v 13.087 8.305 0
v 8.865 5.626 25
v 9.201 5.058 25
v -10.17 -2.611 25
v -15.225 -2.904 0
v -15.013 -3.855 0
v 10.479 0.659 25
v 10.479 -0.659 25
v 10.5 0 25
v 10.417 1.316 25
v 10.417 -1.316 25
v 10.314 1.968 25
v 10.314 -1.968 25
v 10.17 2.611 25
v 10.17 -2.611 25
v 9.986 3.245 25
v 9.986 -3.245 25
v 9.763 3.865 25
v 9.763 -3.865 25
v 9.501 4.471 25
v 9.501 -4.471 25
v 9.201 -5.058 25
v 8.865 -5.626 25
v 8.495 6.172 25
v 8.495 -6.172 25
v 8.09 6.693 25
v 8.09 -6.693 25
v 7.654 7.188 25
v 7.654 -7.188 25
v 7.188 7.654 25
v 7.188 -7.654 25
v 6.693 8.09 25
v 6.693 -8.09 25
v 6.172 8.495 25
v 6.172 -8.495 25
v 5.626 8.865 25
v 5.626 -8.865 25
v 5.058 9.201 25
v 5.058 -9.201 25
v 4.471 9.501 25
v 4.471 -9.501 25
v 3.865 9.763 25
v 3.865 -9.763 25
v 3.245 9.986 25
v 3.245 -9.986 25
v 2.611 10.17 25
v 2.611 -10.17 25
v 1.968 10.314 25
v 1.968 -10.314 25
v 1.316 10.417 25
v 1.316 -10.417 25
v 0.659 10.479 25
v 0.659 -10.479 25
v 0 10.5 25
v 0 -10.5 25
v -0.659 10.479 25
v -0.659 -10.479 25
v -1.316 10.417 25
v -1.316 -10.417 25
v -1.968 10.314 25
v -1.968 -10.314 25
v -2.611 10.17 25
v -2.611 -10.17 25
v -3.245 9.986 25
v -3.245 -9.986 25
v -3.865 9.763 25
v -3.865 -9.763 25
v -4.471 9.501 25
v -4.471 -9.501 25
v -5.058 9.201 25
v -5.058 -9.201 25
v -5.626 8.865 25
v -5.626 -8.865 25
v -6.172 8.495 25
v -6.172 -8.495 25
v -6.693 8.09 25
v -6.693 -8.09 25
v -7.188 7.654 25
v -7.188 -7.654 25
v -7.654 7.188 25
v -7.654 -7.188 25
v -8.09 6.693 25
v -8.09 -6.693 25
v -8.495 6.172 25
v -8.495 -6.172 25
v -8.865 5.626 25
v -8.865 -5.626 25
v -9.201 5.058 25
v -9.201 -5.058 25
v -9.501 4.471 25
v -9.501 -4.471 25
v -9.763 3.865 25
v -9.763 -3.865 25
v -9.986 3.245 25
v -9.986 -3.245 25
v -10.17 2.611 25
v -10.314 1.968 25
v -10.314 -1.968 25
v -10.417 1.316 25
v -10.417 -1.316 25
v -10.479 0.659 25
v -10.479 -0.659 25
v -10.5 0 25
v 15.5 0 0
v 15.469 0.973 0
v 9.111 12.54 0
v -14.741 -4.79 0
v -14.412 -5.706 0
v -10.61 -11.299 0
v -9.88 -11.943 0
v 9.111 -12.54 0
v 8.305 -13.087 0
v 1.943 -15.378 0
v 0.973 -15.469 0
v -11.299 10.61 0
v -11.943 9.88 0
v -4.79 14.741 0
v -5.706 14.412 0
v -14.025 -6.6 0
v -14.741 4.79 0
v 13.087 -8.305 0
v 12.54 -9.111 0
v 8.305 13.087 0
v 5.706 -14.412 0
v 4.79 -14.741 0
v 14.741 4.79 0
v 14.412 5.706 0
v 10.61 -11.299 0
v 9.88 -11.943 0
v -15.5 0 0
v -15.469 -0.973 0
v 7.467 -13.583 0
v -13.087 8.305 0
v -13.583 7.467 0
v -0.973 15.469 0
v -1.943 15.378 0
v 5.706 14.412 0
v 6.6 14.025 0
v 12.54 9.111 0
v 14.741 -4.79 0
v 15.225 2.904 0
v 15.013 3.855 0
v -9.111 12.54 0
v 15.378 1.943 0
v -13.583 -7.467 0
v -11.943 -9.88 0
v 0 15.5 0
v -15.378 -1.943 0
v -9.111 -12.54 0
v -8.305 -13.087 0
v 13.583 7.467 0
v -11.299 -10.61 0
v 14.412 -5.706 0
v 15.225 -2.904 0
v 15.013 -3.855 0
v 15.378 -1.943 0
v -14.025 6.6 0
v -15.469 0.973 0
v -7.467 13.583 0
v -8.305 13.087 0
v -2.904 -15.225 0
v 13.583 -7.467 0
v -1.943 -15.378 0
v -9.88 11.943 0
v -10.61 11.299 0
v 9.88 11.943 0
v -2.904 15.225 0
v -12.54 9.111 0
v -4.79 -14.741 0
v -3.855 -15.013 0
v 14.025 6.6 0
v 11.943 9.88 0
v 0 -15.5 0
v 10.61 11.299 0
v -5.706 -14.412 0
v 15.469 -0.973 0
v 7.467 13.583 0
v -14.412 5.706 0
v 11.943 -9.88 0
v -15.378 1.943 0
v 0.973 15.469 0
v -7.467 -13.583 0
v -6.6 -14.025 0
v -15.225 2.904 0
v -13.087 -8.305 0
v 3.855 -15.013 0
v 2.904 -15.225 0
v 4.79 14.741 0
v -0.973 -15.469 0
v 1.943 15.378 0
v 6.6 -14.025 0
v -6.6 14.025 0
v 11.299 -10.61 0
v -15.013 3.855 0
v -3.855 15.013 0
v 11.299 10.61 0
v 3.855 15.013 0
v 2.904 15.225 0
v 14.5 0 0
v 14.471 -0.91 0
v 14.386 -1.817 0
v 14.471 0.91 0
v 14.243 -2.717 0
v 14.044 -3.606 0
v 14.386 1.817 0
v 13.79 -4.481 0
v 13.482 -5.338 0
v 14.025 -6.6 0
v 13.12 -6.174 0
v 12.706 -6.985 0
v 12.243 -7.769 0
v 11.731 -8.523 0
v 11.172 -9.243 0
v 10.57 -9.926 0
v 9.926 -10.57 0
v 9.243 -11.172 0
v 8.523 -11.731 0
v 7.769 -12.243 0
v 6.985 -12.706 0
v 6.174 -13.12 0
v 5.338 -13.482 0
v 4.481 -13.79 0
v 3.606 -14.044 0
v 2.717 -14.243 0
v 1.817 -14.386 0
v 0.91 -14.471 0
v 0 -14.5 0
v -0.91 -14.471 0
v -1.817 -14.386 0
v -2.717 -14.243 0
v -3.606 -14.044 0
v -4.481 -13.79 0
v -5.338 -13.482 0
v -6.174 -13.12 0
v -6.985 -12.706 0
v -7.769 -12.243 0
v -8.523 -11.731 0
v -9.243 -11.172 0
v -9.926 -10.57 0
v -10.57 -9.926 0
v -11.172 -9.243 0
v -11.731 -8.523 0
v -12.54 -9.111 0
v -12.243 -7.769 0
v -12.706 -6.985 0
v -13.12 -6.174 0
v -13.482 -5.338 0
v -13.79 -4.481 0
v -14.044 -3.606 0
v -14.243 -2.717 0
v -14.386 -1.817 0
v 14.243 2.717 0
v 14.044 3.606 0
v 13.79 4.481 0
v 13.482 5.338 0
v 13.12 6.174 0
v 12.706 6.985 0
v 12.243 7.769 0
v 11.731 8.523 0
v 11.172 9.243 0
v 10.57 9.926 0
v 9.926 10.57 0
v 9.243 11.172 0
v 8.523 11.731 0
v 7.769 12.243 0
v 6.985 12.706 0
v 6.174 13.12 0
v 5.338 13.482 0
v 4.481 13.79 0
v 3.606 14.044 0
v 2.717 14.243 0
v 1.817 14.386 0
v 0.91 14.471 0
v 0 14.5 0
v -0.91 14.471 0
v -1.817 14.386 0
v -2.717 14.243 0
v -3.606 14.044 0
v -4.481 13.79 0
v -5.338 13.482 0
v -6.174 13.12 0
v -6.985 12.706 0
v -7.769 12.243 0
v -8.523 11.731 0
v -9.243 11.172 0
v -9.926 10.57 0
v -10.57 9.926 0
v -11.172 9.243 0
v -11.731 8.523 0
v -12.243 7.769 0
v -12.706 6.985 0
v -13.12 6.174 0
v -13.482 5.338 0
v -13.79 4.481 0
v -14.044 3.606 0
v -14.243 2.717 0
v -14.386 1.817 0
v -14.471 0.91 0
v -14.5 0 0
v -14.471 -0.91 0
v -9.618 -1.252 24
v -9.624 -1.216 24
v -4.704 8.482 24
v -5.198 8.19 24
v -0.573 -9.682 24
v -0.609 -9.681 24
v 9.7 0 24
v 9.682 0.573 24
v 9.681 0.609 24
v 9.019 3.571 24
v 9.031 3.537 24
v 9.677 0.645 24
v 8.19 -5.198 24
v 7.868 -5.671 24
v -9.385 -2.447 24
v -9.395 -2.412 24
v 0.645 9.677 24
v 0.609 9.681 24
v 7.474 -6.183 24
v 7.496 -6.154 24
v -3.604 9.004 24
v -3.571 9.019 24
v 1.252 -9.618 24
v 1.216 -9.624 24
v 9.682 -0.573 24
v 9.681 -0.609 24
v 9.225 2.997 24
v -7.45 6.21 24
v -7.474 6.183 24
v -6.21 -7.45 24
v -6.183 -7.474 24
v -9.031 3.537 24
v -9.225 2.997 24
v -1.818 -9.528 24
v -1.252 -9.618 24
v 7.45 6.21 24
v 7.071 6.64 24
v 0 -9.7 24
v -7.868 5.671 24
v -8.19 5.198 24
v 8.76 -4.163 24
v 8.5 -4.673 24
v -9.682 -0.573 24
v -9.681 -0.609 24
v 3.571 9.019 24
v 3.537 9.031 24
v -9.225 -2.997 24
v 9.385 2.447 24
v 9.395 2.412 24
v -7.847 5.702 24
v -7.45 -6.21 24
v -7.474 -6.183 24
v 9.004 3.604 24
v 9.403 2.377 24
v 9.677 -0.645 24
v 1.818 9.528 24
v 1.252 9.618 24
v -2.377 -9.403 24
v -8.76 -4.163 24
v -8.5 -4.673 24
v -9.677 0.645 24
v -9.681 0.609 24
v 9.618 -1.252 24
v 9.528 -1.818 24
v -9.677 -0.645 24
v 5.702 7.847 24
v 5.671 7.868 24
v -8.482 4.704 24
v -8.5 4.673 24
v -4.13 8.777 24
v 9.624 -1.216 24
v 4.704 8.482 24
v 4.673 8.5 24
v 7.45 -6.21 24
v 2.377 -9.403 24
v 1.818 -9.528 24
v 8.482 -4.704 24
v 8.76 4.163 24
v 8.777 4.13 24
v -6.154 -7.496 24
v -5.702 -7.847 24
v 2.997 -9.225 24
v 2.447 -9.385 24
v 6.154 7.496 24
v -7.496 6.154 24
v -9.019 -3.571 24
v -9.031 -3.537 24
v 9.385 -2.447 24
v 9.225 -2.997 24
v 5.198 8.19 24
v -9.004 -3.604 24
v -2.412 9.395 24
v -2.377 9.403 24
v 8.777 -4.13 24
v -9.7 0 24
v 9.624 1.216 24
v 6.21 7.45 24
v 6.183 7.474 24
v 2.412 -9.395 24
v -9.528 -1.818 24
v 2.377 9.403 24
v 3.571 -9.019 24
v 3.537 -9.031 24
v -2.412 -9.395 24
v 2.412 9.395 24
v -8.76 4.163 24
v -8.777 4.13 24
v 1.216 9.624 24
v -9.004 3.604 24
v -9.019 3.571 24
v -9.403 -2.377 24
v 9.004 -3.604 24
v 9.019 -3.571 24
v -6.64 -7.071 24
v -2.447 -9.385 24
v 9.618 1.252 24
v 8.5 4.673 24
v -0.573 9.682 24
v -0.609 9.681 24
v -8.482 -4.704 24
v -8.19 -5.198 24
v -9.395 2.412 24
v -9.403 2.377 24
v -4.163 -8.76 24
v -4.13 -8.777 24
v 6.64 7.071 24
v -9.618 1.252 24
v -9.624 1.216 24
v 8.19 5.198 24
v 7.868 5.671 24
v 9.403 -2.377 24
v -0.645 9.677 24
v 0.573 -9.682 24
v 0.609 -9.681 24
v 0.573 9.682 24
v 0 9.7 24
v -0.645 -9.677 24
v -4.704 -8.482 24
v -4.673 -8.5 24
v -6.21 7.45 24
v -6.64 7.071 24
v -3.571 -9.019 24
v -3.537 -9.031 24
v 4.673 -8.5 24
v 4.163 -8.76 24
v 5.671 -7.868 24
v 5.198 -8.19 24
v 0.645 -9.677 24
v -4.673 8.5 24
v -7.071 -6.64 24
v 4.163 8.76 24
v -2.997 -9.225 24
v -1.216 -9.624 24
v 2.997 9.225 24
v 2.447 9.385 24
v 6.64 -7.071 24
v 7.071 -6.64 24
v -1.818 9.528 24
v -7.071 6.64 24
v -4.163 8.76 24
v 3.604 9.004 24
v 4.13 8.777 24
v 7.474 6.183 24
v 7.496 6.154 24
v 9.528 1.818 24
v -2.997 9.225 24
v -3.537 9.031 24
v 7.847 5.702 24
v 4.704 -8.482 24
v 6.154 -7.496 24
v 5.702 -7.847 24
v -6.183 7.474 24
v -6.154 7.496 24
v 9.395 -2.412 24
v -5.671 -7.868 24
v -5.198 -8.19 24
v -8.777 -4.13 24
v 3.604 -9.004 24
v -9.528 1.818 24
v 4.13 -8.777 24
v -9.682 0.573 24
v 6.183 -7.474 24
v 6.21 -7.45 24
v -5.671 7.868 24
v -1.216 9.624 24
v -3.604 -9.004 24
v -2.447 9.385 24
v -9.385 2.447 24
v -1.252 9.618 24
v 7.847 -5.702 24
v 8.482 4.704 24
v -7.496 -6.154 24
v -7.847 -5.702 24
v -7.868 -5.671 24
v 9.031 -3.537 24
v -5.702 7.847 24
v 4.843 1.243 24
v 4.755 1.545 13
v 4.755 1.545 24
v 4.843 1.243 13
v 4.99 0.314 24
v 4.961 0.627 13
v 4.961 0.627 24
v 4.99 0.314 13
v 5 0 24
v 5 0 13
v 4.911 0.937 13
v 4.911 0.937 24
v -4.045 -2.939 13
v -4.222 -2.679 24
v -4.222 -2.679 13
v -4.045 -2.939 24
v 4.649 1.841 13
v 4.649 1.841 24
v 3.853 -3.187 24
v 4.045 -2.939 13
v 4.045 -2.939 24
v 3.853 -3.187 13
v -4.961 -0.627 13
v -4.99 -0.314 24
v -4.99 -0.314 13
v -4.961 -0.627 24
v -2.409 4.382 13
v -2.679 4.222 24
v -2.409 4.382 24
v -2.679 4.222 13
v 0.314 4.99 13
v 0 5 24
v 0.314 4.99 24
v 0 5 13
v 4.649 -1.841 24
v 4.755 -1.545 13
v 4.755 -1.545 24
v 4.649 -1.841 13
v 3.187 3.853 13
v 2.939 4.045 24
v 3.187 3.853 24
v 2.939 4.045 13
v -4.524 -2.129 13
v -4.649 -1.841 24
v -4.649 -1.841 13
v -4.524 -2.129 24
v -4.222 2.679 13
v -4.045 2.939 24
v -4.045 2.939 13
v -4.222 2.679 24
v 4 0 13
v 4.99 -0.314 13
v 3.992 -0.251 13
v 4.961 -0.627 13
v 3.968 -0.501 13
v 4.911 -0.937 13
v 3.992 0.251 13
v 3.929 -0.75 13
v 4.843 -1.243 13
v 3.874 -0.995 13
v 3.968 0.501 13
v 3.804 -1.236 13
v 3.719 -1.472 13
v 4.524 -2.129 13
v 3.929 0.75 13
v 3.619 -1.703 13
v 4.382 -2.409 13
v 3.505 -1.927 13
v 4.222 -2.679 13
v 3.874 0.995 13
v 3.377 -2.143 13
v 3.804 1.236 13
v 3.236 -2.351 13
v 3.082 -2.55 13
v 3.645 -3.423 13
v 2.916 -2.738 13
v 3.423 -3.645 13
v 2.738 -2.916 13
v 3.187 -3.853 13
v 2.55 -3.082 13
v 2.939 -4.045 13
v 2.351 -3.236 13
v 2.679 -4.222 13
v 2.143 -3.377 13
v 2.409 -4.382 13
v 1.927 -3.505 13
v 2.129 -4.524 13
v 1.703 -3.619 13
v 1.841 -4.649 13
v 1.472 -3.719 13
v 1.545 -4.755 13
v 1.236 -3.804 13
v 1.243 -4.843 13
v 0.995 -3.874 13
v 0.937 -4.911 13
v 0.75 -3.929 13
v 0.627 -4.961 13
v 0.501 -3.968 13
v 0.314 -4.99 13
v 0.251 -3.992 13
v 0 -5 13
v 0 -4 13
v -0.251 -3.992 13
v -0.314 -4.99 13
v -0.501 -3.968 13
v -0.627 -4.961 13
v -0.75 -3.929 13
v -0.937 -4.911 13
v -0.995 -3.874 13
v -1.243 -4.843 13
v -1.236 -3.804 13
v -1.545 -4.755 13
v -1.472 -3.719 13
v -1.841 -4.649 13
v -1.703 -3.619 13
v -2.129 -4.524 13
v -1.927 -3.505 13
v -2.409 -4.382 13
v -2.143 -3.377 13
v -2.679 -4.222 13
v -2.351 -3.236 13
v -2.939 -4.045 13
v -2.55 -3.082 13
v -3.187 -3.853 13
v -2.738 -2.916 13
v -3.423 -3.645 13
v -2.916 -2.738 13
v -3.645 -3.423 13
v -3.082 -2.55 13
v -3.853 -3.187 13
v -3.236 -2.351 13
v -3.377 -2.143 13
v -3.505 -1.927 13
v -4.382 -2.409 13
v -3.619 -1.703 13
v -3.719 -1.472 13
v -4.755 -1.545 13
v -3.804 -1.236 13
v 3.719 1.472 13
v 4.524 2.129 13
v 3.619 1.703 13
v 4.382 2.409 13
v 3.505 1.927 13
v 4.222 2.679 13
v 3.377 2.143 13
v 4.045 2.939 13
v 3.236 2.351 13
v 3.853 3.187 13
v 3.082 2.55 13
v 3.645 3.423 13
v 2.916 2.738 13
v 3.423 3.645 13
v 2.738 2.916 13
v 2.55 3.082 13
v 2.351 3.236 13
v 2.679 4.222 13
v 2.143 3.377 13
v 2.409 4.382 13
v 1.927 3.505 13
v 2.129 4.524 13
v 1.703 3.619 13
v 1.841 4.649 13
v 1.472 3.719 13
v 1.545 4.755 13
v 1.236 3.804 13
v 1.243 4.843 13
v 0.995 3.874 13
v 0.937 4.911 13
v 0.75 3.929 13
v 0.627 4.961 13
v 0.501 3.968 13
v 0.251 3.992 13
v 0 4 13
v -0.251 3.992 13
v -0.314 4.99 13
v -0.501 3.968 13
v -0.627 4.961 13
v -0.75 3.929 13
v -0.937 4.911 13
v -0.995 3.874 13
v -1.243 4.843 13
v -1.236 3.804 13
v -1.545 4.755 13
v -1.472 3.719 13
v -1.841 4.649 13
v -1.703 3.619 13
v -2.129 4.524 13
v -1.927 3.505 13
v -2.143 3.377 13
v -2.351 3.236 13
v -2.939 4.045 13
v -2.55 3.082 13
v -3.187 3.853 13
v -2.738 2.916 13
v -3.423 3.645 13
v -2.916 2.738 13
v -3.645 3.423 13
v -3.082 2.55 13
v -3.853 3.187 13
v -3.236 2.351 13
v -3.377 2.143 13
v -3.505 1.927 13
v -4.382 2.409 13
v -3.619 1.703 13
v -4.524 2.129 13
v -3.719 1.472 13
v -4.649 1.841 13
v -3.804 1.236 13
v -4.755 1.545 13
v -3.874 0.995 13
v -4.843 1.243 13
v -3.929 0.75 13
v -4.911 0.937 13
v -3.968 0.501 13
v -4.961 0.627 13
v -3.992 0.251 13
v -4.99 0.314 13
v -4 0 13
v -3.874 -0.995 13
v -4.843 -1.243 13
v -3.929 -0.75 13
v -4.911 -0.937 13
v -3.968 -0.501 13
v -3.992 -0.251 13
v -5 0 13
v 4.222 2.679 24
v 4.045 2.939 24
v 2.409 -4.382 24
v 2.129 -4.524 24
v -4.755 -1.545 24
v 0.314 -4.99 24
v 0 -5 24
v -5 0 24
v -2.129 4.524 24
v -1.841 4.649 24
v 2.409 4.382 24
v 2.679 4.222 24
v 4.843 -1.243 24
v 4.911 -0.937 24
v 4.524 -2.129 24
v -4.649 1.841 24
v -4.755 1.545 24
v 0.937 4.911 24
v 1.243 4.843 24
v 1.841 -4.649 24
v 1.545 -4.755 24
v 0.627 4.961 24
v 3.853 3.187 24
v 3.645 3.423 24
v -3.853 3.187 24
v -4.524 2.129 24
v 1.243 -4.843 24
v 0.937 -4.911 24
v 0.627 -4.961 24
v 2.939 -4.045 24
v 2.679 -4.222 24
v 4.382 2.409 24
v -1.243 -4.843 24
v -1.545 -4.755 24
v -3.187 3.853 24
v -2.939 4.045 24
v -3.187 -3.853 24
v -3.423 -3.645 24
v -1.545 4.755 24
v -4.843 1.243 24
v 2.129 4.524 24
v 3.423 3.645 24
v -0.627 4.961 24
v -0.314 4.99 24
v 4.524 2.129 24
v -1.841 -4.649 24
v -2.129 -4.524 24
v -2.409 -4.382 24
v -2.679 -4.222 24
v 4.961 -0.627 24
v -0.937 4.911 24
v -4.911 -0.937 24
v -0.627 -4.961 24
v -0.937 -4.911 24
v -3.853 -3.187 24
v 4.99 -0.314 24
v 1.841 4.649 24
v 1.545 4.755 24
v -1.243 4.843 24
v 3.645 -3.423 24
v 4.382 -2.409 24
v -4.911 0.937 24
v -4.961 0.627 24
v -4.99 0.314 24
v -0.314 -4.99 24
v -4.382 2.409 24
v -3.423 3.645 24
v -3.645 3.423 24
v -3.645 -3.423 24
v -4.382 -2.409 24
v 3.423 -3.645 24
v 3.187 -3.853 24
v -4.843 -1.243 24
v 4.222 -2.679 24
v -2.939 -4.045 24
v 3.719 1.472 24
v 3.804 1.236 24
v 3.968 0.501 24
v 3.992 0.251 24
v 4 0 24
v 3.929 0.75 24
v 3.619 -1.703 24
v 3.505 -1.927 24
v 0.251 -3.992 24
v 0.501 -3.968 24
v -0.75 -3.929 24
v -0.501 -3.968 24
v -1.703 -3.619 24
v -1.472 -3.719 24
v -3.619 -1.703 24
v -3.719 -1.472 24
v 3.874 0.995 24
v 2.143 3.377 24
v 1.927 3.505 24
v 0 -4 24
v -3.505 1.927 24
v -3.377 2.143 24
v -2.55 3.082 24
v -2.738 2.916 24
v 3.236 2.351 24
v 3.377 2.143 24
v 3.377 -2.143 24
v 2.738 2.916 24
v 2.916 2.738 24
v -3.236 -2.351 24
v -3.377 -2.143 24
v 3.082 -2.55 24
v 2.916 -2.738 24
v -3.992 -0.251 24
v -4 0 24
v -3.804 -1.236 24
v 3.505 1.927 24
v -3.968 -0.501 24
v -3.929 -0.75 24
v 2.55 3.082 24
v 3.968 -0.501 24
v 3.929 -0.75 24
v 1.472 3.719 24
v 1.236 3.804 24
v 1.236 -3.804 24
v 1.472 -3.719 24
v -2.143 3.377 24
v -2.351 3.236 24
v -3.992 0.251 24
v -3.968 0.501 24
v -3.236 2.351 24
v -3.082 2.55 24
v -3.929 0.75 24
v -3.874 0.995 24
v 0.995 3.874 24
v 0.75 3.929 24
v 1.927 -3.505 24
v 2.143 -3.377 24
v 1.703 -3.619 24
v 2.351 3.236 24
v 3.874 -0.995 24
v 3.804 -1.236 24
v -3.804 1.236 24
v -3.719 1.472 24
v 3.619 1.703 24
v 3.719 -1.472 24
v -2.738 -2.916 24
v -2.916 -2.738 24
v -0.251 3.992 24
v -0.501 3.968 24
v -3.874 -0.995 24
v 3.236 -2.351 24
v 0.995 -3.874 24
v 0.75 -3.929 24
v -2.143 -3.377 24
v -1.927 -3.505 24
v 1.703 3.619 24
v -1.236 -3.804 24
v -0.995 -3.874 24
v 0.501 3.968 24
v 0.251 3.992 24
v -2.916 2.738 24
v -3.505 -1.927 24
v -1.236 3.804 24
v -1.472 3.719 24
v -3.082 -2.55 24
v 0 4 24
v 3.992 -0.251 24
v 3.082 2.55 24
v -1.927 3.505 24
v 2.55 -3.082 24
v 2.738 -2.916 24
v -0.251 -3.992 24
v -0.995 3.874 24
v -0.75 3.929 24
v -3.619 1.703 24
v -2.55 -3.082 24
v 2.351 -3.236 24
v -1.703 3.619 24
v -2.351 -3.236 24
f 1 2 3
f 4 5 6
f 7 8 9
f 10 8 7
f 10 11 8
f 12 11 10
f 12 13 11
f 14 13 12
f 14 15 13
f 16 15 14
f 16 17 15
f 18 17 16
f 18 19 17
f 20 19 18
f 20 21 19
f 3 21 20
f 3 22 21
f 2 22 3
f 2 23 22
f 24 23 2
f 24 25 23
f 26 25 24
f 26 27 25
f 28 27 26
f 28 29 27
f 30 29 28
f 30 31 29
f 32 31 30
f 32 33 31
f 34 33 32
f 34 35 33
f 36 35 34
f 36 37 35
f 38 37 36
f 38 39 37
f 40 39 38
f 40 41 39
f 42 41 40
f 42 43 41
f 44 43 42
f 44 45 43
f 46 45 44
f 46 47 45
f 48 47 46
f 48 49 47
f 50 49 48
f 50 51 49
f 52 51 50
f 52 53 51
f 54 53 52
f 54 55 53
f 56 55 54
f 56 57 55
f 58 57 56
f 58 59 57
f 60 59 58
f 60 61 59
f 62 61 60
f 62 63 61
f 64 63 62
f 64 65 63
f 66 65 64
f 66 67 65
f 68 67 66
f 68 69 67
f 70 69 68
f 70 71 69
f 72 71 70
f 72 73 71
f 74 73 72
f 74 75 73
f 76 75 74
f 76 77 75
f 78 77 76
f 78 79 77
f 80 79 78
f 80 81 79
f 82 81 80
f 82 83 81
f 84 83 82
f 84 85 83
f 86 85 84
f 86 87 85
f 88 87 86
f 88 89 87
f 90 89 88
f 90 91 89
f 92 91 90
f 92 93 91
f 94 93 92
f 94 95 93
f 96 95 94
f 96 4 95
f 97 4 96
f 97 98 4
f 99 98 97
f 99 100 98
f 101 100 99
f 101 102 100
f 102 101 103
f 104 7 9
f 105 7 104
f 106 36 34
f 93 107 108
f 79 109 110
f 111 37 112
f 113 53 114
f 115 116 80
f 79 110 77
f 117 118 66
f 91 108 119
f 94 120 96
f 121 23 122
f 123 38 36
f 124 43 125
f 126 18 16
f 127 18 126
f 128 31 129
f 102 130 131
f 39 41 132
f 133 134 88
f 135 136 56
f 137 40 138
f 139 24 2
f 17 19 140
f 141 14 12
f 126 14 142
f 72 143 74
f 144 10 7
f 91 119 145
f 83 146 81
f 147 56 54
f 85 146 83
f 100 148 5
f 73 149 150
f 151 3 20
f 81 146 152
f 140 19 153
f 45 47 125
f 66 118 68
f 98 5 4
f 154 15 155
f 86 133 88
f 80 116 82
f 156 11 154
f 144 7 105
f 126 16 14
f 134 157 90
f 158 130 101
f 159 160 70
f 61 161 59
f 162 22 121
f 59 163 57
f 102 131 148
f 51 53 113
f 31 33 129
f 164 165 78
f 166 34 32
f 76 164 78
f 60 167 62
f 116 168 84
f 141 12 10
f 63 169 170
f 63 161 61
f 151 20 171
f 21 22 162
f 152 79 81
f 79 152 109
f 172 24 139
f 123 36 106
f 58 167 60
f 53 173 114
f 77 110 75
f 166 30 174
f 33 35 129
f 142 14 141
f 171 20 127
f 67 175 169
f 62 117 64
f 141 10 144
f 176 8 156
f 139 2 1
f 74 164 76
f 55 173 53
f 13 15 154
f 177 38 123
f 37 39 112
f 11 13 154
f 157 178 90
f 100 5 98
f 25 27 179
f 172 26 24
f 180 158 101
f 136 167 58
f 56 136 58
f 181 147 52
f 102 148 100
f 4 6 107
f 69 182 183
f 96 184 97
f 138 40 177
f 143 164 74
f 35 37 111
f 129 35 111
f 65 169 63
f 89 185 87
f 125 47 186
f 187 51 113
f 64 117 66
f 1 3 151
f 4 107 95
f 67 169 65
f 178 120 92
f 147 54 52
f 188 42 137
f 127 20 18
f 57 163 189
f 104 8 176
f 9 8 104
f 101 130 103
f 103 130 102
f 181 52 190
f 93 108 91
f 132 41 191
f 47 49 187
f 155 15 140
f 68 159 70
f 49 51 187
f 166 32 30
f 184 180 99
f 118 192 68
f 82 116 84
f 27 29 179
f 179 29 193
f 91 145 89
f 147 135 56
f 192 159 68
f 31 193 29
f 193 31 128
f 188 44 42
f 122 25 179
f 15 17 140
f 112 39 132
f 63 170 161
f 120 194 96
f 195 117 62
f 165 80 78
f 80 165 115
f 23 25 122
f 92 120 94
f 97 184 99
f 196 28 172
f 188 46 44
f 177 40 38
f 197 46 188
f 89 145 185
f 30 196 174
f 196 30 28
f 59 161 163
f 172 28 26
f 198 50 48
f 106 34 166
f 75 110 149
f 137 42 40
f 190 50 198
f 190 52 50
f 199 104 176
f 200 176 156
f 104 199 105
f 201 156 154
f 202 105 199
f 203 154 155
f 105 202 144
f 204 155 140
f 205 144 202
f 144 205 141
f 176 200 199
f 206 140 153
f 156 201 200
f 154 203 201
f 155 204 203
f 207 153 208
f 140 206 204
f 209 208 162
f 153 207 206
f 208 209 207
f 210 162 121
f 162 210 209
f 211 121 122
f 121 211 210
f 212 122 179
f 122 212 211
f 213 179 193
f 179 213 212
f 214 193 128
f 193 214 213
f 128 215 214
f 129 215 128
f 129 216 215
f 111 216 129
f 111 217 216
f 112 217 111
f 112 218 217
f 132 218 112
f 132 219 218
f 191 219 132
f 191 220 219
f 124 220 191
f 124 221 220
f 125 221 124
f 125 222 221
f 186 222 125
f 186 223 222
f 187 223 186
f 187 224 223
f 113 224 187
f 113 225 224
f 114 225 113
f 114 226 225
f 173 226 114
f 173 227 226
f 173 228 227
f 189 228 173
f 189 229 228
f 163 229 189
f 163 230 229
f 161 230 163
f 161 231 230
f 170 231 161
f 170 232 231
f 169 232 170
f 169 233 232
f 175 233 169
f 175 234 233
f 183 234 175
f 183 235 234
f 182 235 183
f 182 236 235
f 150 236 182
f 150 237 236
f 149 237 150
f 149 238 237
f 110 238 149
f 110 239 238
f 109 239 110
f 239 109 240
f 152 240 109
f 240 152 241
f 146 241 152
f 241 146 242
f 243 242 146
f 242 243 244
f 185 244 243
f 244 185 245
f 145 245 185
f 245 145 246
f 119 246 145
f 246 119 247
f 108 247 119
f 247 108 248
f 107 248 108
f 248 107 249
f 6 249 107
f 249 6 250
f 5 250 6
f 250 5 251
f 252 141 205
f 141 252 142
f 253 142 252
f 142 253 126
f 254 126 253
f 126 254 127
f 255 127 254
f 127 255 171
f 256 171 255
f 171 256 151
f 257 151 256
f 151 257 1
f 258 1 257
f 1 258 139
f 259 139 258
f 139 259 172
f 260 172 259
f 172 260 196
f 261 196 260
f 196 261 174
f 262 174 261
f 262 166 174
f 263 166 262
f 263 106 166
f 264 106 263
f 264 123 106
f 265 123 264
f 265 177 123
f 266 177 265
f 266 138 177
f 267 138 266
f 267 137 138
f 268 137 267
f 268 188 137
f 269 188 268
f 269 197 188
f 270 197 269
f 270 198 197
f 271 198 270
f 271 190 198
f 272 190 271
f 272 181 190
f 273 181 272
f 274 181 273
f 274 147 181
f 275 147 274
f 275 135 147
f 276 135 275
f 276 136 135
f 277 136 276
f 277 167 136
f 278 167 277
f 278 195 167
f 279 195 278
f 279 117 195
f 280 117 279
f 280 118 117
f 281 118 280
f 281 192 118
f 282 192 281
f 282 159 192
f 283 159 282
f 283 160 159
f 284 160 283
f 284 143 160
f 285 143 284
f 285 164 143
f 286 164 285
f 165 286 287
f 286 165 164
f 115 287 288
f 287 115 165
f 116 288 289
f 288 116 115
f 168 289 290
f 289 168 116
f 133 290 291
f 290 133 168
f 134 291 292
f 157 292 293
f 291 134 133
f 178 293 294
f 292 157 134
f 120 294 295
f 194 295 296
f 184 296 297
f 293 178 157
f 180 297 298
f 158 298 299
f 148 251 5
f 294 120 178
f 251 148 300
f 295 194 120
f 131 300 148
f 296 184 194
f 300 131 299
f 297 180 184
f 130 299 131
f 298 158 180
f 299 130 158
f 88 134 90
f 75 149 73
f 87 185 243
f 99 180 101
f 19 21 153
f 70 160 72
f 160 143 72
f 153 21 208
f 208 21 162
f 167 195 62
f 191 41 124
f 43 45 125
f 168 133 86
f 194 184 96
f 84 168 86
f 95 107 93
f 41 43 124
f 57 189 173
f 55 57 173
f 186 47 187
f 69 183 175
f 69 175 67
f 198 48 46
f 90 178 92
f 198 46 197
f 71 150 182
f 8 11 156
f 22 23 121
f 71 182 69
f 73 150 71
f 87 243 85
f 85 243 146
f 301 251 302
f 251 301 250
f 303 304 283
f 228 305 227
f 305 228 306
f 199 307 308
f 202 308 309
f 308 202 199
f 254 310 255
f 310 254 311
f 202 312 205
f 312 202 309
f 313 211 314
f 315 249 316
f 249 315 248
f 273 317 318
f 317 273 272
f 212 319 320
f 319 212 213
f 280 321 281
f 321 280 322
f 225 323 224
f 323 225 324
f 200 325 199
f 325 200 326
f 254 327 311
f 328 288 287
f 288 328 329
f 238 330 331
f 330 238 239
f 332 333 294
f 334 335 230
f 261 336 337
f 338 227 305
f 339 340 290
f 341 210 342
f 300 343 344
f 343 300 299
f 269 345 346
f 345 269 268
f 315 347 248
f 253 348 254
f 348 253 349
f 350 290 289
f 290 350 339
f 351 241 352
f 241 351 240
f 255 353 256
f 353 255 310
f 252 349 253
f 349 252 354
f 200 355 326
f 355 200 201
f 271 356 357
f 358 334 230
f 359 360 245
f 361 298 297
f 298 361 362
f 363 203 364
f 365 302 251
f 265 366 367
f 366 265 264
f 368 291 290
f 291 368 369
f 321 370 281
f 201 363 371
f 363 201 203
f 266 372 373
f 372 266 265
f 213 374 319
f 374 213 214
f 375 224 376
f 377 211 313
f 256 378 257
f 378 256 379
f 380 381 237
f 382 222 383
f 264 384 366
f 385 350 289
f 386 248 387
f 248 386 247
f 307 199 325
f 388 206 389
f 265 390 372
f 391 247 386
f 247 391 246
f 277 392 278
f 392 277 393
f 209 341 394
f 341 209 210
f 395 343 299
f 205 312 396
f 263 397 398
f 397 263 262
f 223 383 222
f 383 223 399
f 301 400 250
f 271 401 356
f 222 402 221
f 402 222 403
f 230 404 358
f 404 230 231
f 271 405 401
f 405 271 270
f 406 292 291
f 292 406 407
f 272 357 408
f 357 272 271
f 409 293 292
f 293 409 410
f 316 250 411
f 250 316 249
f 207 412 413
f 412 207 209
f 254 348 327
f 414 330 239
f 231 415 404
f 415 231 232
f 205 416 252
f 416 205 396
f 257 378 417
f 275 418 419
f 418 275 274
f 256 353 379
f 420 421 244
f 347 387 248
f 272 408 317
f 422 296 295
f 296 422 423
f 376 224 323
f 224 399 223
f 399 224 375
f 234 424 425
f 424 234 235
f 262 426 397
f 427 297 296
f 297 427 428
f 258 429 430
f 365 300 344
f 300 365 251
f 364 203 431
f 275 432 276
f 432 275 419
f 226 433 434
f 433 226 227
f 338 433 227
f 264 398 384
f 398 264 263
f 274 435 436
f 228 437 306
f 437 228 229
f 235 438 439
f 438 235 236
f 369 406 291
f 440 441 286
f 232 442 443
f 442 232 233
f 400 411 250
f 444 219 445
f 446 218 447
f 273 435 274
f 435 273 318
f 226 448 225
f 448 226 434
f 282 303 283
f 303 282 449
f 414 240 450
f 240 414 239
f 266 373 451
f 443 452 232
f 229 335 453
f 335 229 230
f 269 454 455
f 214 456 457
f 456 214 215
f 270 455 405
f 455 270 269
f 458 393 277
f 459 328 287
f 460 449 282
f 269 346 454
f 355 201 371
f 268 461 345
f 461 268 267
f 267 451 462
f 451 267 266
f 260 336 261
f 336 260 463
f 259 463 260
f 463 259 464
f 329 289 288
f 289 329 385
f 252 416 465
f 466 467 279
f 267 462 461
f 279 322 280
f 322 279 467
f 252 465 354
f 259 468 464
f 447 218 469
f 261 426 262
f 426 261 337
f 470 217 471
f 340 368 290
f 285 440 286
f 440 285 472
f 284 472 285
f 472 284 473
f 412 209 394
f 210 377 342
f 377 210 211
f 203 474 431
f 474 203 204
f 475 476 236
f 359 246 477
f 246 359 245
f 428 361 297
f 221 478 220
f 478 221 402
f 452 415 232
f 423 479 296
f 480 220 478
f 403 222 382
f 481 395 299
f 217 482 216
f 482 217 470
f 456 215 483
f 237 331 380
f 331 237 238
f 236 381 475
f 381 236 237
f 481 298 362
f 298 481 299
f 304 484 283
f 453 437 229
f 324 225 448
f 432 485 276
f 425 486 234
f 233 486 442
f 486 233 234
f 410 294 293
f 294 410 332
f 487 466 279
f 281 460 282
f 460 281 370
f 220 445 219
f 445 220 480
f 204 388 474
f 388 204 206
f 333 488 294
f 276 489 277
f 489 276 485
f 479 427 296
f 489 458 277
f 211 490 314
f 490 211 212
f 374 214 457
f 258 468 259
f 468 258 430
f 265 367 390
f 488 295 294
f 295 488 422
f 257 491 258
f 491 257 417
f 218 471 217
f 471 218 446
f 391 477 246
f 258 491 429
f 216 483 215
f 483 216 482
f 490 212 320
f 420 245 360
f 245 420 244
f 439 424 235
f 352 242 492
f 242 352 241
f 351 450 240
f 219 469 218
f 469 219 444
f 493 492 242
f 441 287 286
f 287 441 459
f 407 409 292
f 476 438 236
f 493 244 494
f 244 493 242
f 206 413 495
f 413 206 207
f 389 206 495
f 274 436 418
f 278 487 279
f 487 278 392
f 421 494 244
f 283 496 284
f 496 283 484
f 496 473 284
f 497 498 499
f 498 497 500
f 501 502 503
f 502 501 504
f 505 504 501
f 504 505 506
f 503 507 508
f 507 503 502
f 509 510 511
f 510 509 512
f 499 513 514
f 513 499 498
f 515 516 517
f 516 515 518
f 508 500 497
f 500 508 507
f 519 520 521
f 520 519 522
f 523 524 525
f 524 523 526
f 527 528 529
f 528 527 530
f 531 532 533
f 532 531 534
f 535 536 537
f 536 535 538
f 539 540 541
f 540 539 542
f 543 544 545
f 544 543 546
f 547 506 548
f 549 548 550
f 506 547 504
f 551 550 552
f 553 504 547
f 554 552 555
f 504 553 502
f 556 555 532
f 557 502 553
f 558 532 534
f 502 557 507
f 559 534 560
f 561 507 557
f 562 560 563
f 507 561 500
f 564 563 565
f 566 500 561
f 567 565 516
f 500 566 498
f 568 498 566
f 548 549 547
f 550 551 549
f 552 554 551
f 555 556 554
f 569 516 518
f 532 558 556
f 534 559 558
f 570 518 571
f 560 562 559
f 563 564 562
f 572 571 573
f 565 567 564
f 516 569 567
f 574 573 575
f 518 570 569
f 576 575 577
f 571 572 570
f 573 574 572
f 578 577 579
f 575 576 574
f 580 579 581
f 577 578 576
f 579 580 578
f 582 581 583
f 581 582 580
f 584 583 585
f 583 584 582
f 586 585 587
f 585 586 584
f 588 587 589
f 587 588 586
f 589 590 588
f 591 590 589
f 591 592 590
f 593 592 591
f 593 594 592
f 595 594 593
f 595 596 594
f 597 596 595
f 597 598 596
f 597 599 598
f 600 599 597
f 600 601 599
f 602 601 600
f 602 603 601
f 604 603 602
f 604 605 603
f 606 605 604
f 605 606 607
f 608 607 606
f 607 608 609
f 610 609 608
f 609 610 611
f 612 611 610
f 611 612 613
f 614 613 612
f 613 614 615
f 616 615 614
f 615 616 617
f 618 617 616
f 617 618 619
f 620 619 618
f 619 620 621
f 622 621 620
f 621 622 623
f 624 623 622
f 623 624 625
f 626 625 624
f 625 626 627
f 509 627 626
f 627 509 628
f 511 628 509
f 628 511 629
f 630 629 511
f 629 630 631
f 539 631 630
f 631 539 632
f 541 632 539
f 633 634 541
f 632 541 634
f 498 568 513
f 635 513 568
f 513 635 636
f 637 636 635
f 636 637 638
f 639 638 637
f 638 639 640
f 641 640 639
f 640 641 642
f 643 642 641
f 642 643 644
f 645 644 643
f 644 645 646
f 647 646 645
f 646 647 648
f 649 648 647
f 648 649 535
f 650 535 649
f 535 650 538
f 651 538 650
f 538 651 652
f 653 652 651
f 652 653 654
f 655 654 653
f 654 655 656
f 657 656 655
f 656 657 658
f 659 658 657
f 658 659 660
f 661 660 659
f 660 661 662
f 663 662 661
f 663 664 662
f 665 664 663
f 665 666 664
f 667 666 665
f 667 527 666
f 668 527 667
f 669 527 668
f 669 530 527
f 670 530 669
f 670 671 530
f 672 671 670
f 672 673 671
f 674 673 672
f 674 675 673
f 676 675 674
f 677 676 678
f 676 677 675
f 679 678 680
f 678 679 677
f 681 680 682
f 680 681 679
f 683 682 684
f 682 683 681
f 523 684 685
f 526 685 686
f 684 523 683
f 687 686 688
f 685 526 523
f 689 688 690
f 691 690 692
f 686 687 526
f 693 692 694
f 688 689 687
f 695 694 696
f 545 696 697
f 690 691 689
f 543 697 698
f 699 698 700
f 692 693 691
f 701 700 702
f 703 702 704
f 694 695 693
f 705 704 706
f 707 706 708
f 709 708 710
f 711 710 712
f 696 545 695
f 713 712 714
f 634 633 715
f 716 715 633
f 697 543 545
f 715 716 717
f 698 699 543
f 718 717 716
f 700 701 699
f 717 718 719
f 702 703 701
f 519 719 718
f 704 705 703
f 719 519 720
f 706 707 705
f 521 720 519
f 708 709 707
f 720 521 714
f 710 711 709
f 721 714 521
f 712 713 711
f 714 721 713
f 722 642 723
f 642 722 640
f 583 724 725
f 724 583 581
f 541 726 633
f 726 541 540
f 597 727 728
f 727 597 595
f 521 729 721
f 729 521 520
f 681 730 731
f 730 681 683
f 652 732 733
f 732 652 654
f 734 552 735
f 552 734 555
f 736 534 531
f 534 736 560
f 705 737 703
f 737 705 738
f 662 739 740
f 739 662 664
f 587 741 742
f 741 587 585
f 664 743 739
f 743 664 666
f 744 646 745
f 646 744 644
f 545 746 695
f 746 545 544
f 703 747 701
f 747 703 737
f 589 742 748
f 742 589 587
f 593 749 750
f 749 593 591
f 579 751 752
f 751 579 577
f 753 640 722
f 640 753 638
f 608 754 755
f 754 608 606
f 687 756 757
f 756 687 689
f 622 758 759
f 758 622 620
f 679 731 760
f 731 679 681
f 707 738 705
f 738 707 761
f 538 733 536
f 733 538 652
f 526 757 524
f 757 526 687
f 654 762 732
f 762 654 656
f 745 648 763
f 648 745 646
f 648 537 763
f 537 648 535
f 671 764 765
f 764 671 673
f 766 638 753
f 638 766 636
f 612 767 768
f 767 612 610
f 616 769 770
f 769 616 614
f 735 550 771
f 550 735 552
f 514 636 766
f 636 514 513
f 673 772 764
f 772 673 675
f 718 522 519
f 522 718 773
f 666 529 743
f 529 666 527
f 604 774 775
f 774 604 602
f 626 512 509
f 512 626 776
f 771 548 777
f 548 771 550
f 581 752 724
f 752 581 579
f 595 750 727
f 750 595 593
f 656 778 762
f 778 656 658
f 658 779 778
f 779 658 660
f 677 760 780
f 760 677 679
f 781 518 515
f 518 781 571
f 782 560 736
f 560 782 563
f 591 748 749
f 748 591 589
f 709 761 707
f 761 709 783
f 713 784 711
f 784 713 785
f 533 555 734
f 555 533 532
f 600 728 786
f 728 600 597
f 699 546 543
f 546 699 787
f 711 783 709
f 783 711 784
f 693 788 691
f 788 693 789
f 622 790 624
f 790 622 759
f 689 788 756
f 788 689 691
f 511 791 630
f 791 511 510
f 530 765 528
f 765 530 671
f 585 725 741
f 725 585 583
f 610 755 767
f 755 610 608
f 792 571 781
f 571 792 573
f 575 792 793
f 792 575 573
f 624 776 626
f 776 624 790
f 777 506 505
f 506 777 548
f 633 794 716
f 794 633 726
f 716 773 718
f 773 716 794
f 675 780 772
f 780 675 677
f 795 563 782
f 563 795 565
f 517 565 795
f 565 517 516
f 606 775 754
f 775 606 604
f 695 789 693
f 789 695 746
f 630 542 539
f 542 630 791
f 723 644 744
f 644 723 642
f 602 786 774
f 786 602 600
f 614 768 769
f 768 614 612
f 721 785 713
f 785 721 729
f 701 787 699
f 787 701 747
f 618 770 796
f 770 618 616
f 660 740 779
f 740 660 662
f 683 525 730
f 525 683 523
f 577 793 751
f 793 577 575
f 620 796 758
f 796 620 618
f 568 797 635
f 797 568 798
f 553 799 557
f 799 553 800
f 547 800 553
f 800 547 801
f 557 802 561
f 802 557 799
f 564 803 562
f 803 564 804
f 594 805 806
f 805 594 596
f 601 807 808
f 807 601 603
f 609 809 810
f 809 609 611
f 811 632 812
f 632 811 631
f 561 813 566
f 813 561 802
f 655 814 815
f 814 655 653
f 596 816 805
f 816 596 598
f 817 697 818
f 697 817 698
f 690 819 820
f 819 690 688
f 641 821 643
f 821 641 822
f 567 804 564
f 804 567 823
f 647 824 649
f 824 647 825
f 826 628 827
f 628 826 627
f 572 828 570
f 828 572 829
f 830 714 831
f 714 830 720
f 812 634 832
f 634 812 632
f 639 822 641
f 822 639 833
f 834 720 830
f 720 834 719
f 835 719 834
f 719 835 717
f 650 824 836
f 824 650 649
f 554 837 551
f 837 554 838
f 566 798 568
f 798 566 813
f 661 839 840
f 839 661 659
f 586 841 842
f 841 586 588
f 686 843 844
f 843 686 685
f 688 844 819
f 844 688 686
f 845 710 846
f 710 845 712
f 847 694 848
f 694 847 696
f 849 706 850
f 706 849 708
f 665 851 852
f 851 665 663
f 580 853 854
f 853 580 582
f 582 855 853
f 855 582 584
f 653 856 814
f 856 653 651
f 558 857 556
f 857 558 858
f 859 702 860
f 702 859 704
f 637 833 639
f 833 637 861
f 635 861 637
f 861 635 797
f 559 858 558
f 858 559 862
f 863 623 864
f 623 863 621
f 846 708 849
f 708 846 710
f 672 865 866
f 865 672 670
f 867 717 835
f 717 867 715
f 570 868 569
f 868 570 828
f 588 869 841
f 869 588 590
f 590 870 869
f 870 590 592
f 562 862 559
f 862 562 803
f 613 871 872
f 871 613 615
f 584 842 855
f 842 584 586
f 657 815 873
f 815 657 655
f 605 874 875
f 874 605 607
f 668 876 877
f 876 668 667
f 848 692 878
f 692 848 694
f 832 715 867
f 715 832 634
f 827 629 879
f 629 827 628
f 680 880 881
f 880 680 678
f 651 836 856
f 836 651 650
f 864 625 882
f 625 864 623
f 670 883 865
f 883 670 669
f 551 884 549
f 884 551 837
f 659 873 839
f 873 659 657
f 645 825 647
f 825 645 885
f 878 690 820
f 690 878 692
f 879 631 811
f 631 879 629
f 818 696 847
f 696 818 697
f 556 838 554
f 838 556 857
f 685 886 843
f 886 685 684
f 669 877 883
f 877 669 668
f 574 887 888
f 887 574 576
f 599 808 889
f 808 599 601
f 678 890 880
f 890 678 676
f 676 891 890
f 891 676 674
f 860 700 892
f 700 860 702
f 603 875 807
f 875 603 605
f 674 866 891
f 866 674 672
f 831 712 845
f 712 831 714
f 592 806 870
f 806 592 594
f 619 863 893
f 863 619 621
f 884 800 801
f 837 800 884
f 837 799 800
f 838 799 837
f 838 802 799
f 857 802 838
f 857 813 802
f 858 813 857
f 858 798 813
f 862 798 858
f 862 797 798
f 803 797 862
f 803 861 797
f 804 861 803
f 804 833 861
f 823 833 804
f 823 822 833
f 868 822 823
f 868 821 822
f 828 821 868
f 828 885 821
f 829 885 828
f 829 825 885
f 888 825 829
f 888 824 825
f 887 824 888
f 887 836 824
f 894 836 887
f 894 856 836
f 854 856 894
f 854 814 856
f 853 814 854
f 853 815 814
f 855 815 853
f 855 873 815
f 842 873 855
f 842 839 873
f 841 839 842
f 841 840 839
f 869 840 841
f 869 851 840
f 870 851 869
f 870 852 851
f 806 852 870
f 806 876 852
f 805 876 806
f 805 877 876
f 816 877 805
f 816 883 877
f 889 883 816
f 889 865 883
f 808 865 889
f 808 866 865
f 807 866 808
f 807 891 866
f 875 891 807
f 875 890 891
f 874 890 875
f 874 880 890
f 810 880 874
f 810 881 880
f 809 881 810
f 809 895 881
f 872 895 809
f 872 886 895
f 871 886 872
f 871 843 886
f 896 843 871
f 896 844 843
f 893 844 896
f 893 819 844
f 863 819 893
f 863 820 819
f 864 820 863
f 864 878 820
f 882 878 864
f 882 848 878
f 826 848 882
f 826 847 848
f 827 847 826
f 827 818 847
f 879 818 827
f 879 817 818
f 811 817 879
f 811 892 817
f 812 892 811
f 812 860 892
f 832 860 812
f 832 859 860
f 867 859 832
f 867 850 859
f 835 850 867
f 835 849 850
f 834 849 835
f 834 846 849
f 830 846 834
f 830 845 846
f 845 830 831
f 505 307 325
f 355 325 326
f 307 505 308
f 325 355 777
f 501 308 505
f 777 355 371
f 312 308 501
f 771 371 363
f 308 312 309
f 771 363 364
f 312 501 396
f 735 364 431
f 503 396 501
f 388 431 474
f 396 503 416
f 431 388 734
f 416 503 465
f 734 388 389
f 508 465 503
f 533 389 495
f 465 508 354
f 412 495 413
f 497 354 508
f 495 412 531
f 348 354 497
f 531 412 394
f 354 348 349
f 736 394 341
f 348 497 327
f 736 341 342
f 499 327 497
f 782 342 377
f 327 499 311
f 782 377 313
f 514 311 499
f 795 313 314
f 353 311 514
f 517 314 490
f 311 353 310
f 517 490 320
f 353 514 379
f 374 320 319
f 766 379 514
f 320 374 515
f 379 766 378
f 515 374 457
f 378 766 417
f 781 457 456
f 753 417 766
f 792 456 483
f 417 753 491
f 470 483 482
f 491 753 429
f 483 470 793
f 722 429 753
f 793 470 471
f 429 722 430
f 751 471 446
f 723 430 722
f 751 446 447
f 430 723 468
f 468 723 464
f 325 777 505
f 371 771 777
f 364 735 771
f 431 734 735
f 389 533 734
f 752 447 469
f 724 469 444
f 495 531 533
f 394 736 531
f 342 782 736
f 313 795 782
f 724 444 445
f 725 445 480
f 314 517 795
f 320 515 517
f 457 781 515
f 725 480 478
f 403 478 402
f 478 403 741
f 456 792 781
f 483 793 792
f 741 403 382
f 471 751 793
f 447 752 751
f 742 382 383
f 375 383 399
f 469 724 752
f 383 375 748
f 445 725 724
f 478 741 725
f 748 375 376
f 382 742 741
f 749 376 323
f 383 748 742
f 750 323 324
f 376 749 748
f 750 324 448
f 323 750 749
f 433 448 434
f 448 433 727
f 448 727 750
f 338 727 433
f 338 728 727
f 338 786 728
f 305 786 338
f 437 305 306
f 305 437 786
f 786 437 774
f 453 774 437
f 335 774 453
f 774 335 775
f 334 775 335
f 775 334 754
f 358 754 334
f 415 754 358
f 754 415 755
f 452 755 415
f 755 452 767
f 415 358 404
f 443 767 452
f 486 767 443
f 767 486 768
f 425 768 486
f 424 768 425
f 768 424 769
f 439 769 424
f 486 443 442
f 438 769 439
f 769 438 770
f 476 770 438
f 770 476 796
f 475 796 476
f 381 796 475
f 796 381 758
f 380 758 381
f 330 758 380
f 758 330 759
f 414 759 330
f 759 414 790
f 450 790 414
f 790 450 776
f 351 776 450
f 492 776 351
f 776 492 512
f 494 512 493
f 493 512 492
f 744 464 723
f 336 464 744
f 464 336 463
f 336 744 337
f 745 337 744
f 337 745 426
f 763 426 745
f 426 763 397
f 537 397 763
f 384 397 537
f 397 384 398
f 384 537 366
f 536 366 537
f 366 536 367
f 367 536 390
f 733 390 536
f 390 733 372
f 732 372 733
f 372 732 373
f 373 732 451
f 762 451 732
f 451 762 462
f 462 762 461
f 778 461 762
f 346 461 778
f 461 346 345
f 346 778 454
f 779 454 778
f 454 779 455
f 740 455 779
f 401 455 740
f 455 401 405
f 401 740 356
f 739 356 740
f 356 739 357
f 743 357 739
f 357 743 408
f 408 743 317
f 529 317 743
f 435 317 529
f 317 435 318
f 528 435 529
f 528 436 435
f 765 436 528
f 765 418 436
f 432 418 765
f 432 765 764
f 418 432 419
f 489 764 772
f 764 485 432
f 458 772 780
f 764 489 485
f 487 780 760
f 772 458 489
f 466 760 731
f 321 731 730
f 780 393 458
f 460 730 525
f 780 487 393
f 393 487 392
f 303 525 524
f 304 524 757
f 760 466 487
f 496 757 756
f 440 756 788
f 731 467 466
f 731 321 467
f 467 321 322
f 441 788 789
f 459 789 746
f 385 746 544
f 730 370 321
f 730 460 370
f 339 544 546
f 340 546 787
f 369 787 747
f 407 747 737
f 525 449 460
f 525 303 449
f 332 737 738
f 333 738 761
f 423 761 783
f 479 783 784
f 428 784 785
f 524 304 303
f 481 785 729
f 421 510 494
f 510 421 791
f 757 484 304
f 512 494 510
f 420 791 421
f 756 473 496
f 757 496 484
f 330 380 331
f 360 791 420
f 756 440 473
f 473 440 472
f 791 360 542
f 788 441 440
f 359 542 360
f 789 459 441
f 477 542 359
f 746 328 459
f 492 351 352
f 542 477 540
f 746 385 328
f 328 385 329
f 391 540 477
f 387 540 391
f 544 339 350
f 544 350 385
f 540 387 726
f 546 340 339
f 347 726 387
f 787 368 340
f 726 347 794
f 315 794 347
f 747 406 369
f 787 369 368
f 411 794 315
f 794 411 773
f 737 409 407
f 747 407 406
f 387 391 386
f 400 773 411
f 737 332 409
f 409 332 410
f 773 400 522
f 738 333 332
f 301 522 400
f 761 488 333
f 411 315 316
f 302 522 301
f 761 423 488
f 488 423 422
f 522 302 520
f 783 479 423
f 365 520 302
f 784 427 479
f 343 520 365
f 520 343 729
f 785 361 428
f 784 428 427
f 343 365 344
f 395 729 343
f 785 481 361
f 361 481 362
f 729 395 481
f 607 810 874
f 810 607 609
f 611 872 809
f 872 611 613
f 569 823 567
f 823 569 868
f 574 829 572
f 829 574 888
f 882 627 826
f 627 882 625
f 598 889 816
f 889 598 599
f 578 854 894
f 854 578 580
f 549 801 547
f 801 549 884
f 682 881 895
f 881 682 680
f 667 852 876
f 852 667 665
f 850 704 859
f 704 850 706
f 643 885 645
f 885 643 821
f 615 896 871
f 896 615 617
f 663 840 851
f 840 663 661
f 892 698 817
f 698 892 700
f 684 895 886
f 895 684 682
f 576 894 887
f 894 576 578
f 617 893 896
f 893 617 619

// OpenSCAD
difference()
{
cylinder(d1=31, d2=21, h=25, $fn=100);
cylinder(d1=29, d2=19, h=25, $fn=100);
}

translate([0,0,24]) cylinder(d=20, h=1, $fn=100);
translate([0,0,13]) difference()
{
cylinder(d=10,h=12, $fn=100);
cylinder(d=8,h=11, $fn=100);
}
